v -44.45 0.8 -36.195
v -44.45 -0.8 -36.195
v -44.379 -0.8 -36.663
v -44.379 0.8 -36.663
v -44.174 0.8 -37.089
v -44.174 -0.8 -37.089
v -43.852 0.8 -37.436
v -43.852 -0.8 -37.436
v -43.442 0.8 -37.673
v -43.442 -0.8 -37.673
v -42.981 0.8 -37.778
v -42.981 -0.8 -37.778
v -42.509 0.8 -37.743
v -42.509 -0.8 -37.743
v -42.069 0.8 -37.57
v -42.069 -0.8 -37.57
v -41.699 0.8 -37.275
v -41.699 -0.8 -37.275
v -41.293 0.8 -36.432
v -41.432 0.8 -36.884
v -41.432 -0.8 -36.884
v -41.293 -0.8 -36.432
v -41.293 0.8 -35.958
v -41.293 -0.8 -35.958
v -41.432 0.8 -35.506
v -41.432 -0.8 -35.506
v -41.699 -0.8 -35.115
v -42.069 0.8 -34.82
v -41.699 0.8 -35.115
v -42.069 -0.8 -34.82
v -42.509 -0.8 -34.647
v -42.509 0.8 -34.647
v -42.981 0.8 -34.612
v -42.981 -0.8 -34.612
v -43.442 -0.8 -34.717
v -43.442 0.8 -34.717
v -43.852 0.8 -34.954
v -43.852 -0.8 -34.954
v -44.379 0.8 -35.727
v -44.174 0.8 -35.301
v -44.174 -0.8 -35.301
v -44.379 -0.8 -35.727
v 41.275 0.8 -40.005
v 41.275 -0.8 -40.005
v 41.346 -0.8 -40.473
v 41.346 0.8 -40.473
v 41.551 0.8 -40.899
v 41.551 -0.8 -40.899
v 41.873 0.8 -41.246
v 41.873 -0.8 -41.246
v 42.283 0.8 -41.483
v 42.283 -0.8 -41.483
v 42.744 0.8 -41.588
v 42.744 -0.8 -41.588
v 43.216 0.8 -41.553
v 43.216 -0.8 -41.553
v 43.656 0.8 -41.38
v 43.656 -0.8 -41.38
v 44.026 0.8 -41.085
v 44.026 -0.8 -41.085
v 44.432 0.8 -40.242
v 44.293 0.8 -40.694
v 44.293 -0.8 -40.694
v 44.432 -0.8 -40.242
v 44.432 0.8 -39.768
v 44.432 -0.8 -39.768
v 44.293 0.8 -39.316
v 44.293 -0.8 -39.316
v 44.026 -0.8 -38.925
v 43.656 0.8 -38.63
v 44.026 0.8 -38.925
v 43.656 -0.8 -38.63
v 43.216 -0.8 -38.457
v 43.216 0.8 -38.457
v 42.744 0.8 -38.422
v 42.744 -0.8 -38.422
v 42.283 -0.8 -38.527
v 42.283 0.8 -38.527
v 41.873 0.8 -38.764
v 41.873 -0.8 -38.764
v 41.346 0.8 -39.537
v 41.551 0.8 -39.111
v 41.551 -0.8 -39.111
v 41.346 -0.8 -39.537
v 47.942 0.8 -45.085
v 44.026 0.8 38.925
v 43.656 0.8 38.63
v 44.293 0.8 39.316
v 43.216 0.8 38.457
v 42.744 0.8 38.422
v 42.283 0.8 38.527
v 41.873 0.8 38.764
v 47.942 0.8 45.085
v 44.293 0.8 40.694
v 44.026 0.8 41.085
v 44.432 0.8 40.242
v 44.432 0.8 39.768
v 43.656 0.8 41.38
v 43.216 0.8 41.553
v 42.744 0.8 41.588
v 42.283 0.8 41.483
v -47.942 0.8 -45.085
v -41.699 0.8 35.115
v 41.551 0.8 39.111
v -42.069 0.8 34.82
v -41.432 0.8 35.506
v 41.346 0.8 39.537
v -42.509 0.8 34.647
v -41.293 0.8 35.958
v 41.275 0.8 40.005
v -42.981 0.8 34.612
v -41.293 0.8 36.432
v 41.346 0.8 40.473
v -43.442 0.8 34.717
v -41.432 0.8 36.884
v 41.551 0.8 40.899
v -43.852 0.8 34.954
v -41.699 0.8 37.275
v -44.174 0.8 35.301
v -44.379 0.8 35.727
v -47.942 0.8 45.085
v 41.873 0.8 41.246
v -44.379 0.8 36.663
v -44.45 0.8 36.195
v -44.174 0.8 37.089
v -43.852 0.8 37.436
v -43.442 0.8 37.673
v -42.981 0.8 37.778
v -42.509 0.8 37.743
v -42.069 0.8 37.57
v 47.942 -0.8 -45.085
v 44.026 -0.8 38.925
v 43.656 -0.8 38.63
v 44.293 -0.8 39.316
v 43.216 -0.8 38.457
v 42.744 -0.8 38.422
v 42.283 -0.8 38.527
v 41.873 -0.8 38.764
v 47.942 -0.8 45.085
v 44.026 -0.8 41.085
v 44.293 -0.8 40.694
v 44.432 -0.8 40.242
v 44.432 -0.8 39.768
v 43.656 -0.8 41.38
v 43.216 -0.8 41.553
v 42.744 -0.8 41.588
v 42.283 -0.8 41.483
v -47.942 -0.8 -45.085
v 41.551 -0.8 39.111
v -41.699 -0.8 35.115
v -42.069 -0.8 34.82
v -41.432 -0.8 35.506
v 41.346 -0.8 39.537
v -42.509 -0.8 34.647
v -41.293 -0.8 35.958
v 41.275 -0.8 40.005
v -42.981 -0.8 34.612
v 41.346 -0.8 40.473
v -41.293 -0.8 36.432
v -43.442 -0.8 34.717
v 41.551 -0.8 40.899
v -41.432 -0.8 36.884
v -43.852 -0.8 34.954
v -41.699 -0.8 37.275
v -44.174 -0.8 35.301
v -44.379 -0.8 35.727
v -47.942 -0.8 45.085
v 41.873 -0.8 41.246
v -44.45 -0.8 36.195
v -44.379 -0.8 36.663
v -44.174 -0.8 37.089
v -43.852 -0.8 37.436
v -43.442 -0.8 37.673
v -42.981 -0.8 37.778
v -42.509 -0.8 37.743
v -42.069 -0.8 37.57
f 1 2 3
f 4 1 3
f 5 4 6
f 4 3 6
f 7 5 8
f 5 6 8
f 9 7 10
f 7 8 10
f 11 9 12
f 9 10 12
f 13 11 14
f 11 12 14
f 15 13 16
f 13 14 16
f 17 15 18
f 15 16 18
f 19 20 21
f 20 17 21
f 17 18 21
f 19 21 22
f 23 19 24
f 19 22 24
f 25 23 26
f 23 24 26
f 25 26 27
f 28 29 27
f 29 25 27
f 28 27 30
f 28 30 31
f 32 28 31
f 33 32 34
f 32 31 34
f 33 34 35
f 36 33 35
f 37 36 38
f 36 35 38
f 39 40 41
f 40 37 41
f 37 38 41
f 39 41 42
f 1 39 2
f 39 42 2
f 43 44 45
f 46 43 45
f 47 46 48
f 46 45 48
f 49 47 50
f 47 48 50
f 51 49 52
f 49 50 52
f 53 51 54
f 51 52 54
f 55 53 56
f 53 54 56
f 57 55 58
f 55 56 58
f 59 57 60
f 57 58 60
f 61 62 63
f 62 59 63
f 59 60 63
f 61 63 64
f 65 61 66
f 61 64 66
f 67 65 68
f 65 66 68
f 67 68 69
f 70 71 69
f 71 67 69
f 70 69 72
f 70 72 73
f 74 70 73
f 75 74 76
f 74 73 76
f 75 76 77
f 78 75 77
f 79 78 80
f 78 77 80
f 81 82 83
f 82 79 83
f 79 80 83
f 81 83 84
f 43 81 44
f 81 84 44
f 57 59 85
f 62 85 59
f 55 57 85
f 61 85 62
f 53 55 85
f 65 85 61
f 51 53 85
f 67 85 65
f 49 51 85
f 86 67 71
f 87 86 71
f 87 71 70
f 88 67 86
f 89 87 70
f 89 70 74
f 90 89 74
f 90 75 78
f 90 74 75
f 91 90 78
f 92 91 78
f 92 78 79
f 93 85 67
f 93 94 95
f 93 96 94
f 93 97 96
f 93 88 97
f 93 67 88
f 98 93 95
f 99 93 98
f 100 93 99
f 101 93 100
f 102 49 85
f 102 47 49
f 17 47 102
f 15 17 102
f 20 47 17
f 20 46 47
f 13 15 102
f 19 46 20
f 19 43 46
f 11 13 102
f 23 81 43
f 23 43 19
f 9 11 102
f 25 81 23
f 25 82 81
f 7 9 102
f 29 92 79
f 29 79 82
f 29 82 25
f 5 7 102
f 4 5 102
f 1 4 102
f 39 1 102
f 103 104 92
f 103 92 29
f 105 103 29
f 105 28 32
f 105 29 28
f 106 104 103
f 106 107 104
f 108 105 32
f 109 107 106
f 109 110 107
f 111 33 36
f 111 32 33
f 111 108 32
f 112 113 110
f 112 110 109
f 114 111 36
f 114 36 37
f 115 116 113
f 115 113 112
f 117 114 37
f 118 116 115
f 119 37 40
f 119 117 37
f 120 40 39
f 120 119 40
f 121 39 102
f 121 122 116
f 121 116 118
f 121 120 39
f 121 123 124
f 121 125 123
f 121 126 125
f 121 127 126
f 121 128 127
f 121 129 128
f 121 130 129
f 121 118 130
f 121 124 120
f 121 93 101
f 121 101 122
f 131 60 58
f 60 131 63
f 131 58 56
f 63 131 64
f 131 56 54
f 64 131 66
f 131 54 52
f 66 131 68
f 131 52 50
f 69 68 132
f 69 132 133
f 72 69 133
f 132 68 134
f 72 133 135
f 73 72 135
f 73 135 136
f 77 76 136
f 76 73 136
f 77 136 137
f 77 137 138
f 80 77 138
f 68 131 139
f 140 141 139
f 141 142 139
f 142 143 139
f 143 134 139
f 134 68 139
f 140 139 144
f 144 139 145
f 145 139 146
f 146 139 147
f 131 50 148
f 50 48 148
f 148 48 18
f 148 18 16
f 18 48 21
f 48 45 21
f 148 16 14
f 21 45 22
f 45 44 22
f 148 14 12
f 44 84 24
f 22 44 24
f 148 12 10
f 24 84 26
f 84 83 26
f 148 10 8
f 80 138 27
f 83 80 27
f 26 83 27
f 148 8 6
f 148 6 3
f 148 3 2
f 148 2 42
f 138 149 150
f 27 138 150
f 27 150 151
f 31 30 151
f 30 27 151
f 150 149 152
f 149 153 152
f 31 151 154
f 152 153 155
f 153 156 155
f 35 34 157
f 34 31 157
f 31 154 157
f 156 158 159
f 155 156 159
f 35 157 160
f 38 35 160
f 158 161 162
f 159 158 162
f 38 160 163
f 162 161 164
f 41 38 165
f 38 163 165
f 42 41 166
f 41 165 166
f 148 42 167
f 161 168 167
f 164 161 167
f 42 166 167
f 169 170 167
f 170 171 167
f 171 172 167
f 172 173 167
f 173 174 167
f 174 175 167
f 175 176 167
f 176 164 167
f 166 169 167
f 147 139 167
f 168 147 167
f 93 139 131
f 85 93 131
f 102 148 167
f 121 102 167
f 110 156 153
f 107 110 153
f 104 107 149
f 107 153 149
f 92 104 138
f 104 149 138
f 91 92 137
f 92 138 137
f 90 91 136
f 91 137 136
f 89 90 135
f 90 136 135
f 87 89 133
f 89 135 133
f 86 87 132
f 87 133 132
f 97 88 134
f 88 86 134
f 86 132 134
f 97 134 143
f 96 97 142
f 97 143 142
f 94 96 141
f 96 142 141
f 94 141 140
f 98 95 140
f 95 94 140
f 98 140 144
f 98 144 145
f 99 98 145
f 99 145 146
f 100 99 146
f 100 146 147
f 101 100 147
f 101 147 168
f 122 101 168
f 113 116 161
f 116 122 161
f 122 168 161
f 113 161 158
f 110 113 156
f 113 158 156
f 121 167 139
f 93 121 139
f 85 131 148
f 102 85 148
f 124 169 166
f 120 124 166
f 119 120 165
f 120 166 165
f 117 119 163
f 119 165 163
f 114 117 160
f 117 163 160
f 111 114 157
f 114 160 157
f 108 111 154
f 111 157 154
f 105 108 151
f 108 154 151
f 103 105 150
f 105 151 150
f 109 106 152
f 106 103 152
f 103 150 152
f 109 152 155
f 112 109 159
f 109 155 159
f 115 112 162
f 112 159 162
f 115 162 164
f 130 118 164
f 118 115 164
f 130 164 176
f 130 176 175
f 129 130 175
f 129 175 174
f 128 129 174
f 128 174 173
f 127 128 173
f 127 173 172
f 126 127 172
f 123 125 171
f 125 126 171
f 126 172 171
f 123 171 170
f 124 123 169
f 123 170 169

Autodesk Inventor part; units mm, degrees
ref_plane "YZ Plane" through (0, 0, 0) normal (1, 0, 0) x (0, 1, 0)
ref_plane "XZ Plane" through (0, 0, 0) normal (0, 1, 0) x (-1, 0, 0)
ref_plane "XY Plane" through (0, 0, 0) normal (0, 0, 1) x (1, 0, 0)
sketch "Sketch1" plane through (0, 0, 0) normal (0, 1, 0) x (-1, 0, 0)
  line L0 (47.9425, 45.085) -> (-47.9425, 45.085)
  line L1 (-47.9425, 45.085) -> (-47.9425, -45.085)
  line L2 (-47.9425, -45.085) -> (47.9425, -45.085)
  line L3 (47.9425, -45.085) -> (47.9425, 45.085)
  line L4 (47.9425, 45.085) -> (-47.9425, -45.085) construction
  line L5 (-47.9425, 45.085) -> (47.9425, -45.085) construction
  circle A0 centre (42.8625, 36.195) radius 1.5875
  circle A1 centre (42.8625, -36.195) radius 1.5875
  circle A2 centre (-42.8625, -40.005) radius 1.5875
  circle A3 centre (-42.8625, 40.005) radius 1.5875
  point P0 (0, 0)
  dimension "d0" = 90.17
  dimension "d1" = 95.885
  dimension "d2" = 5.08
  dimension "d3" = 5.08
  dimension "d4" = 5.08
  dimension "d5" = 8.89
  dimension "d6" = 8.89
  dimension "d7" = 5.08
  dimension "d8" = 3.175
  dimension "d9" = 3.175
  dimension "d10" = 3.175
  dimension "d11" = 3.175
extrude "Extrusion1" add sketch "Sketch1" along normal mid plane 1.6
equation "\"d7\" = d4"
equation "\"d9\" = d8"
equation "\"d10\" = d8"
equation "\"d11\" = d8"
properties part number "PC 104 size and hole model" material "FR-4"
